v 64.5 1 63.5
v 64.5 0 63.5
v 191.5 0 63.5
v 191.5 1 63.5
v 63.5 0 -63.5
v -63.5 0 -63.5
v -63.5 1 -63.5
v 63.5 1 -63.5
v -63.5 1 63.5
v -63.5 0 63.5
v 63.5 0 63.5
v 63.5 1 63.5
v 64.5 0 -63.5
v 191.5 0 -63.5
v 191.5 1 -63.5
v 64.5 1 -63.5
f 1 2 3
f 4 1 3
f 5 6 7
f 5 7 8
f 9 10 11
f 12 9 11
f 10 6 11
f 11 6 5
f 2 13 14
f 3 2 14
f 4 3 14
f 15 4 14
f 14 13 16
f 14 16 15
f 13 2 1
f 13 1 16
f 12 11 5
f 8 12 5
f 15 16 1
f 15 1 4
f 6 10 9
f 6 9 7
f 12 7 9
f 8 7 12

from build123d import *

# Parameters (mm, degrees)
SKETCH1_W             = 127
SKETCH1_H             = 127
BOSS_EXTRUDE1_DEPTH   = 1
BOSS_EXTRUDE1_2_DEPTH = 1


with BuildPart() as part:
    # Sketch1 → Boss-Extrude1 (new body)
    with BuildSketch(Plane(origin=(0, 0, 0), x_dir=(1, 0, 0), z_dir=(0, 1, 0))):
        with Locations((128, 0)):
            Rectangle(SKETCH1_W, SKETCH1_H)
    extrude(amount=BOSS_EXTRUDE1_DEPTH)


with BuildPart() as body_2:
    # Sketch1 → Boss-Extrude1 2 (new body)
    with BuildSketch(Plane(origin=(0, 0, 0), x_dir=(1, 0, 0), z_dir=(0, 1, 0))):
        Rectangle(SKETCH1_W, SKETCH1_H)
    extrude(amount=BOSS_EXTRUDE1_2_DEPTH)


solid = Compound([part.part, body_2.part])
